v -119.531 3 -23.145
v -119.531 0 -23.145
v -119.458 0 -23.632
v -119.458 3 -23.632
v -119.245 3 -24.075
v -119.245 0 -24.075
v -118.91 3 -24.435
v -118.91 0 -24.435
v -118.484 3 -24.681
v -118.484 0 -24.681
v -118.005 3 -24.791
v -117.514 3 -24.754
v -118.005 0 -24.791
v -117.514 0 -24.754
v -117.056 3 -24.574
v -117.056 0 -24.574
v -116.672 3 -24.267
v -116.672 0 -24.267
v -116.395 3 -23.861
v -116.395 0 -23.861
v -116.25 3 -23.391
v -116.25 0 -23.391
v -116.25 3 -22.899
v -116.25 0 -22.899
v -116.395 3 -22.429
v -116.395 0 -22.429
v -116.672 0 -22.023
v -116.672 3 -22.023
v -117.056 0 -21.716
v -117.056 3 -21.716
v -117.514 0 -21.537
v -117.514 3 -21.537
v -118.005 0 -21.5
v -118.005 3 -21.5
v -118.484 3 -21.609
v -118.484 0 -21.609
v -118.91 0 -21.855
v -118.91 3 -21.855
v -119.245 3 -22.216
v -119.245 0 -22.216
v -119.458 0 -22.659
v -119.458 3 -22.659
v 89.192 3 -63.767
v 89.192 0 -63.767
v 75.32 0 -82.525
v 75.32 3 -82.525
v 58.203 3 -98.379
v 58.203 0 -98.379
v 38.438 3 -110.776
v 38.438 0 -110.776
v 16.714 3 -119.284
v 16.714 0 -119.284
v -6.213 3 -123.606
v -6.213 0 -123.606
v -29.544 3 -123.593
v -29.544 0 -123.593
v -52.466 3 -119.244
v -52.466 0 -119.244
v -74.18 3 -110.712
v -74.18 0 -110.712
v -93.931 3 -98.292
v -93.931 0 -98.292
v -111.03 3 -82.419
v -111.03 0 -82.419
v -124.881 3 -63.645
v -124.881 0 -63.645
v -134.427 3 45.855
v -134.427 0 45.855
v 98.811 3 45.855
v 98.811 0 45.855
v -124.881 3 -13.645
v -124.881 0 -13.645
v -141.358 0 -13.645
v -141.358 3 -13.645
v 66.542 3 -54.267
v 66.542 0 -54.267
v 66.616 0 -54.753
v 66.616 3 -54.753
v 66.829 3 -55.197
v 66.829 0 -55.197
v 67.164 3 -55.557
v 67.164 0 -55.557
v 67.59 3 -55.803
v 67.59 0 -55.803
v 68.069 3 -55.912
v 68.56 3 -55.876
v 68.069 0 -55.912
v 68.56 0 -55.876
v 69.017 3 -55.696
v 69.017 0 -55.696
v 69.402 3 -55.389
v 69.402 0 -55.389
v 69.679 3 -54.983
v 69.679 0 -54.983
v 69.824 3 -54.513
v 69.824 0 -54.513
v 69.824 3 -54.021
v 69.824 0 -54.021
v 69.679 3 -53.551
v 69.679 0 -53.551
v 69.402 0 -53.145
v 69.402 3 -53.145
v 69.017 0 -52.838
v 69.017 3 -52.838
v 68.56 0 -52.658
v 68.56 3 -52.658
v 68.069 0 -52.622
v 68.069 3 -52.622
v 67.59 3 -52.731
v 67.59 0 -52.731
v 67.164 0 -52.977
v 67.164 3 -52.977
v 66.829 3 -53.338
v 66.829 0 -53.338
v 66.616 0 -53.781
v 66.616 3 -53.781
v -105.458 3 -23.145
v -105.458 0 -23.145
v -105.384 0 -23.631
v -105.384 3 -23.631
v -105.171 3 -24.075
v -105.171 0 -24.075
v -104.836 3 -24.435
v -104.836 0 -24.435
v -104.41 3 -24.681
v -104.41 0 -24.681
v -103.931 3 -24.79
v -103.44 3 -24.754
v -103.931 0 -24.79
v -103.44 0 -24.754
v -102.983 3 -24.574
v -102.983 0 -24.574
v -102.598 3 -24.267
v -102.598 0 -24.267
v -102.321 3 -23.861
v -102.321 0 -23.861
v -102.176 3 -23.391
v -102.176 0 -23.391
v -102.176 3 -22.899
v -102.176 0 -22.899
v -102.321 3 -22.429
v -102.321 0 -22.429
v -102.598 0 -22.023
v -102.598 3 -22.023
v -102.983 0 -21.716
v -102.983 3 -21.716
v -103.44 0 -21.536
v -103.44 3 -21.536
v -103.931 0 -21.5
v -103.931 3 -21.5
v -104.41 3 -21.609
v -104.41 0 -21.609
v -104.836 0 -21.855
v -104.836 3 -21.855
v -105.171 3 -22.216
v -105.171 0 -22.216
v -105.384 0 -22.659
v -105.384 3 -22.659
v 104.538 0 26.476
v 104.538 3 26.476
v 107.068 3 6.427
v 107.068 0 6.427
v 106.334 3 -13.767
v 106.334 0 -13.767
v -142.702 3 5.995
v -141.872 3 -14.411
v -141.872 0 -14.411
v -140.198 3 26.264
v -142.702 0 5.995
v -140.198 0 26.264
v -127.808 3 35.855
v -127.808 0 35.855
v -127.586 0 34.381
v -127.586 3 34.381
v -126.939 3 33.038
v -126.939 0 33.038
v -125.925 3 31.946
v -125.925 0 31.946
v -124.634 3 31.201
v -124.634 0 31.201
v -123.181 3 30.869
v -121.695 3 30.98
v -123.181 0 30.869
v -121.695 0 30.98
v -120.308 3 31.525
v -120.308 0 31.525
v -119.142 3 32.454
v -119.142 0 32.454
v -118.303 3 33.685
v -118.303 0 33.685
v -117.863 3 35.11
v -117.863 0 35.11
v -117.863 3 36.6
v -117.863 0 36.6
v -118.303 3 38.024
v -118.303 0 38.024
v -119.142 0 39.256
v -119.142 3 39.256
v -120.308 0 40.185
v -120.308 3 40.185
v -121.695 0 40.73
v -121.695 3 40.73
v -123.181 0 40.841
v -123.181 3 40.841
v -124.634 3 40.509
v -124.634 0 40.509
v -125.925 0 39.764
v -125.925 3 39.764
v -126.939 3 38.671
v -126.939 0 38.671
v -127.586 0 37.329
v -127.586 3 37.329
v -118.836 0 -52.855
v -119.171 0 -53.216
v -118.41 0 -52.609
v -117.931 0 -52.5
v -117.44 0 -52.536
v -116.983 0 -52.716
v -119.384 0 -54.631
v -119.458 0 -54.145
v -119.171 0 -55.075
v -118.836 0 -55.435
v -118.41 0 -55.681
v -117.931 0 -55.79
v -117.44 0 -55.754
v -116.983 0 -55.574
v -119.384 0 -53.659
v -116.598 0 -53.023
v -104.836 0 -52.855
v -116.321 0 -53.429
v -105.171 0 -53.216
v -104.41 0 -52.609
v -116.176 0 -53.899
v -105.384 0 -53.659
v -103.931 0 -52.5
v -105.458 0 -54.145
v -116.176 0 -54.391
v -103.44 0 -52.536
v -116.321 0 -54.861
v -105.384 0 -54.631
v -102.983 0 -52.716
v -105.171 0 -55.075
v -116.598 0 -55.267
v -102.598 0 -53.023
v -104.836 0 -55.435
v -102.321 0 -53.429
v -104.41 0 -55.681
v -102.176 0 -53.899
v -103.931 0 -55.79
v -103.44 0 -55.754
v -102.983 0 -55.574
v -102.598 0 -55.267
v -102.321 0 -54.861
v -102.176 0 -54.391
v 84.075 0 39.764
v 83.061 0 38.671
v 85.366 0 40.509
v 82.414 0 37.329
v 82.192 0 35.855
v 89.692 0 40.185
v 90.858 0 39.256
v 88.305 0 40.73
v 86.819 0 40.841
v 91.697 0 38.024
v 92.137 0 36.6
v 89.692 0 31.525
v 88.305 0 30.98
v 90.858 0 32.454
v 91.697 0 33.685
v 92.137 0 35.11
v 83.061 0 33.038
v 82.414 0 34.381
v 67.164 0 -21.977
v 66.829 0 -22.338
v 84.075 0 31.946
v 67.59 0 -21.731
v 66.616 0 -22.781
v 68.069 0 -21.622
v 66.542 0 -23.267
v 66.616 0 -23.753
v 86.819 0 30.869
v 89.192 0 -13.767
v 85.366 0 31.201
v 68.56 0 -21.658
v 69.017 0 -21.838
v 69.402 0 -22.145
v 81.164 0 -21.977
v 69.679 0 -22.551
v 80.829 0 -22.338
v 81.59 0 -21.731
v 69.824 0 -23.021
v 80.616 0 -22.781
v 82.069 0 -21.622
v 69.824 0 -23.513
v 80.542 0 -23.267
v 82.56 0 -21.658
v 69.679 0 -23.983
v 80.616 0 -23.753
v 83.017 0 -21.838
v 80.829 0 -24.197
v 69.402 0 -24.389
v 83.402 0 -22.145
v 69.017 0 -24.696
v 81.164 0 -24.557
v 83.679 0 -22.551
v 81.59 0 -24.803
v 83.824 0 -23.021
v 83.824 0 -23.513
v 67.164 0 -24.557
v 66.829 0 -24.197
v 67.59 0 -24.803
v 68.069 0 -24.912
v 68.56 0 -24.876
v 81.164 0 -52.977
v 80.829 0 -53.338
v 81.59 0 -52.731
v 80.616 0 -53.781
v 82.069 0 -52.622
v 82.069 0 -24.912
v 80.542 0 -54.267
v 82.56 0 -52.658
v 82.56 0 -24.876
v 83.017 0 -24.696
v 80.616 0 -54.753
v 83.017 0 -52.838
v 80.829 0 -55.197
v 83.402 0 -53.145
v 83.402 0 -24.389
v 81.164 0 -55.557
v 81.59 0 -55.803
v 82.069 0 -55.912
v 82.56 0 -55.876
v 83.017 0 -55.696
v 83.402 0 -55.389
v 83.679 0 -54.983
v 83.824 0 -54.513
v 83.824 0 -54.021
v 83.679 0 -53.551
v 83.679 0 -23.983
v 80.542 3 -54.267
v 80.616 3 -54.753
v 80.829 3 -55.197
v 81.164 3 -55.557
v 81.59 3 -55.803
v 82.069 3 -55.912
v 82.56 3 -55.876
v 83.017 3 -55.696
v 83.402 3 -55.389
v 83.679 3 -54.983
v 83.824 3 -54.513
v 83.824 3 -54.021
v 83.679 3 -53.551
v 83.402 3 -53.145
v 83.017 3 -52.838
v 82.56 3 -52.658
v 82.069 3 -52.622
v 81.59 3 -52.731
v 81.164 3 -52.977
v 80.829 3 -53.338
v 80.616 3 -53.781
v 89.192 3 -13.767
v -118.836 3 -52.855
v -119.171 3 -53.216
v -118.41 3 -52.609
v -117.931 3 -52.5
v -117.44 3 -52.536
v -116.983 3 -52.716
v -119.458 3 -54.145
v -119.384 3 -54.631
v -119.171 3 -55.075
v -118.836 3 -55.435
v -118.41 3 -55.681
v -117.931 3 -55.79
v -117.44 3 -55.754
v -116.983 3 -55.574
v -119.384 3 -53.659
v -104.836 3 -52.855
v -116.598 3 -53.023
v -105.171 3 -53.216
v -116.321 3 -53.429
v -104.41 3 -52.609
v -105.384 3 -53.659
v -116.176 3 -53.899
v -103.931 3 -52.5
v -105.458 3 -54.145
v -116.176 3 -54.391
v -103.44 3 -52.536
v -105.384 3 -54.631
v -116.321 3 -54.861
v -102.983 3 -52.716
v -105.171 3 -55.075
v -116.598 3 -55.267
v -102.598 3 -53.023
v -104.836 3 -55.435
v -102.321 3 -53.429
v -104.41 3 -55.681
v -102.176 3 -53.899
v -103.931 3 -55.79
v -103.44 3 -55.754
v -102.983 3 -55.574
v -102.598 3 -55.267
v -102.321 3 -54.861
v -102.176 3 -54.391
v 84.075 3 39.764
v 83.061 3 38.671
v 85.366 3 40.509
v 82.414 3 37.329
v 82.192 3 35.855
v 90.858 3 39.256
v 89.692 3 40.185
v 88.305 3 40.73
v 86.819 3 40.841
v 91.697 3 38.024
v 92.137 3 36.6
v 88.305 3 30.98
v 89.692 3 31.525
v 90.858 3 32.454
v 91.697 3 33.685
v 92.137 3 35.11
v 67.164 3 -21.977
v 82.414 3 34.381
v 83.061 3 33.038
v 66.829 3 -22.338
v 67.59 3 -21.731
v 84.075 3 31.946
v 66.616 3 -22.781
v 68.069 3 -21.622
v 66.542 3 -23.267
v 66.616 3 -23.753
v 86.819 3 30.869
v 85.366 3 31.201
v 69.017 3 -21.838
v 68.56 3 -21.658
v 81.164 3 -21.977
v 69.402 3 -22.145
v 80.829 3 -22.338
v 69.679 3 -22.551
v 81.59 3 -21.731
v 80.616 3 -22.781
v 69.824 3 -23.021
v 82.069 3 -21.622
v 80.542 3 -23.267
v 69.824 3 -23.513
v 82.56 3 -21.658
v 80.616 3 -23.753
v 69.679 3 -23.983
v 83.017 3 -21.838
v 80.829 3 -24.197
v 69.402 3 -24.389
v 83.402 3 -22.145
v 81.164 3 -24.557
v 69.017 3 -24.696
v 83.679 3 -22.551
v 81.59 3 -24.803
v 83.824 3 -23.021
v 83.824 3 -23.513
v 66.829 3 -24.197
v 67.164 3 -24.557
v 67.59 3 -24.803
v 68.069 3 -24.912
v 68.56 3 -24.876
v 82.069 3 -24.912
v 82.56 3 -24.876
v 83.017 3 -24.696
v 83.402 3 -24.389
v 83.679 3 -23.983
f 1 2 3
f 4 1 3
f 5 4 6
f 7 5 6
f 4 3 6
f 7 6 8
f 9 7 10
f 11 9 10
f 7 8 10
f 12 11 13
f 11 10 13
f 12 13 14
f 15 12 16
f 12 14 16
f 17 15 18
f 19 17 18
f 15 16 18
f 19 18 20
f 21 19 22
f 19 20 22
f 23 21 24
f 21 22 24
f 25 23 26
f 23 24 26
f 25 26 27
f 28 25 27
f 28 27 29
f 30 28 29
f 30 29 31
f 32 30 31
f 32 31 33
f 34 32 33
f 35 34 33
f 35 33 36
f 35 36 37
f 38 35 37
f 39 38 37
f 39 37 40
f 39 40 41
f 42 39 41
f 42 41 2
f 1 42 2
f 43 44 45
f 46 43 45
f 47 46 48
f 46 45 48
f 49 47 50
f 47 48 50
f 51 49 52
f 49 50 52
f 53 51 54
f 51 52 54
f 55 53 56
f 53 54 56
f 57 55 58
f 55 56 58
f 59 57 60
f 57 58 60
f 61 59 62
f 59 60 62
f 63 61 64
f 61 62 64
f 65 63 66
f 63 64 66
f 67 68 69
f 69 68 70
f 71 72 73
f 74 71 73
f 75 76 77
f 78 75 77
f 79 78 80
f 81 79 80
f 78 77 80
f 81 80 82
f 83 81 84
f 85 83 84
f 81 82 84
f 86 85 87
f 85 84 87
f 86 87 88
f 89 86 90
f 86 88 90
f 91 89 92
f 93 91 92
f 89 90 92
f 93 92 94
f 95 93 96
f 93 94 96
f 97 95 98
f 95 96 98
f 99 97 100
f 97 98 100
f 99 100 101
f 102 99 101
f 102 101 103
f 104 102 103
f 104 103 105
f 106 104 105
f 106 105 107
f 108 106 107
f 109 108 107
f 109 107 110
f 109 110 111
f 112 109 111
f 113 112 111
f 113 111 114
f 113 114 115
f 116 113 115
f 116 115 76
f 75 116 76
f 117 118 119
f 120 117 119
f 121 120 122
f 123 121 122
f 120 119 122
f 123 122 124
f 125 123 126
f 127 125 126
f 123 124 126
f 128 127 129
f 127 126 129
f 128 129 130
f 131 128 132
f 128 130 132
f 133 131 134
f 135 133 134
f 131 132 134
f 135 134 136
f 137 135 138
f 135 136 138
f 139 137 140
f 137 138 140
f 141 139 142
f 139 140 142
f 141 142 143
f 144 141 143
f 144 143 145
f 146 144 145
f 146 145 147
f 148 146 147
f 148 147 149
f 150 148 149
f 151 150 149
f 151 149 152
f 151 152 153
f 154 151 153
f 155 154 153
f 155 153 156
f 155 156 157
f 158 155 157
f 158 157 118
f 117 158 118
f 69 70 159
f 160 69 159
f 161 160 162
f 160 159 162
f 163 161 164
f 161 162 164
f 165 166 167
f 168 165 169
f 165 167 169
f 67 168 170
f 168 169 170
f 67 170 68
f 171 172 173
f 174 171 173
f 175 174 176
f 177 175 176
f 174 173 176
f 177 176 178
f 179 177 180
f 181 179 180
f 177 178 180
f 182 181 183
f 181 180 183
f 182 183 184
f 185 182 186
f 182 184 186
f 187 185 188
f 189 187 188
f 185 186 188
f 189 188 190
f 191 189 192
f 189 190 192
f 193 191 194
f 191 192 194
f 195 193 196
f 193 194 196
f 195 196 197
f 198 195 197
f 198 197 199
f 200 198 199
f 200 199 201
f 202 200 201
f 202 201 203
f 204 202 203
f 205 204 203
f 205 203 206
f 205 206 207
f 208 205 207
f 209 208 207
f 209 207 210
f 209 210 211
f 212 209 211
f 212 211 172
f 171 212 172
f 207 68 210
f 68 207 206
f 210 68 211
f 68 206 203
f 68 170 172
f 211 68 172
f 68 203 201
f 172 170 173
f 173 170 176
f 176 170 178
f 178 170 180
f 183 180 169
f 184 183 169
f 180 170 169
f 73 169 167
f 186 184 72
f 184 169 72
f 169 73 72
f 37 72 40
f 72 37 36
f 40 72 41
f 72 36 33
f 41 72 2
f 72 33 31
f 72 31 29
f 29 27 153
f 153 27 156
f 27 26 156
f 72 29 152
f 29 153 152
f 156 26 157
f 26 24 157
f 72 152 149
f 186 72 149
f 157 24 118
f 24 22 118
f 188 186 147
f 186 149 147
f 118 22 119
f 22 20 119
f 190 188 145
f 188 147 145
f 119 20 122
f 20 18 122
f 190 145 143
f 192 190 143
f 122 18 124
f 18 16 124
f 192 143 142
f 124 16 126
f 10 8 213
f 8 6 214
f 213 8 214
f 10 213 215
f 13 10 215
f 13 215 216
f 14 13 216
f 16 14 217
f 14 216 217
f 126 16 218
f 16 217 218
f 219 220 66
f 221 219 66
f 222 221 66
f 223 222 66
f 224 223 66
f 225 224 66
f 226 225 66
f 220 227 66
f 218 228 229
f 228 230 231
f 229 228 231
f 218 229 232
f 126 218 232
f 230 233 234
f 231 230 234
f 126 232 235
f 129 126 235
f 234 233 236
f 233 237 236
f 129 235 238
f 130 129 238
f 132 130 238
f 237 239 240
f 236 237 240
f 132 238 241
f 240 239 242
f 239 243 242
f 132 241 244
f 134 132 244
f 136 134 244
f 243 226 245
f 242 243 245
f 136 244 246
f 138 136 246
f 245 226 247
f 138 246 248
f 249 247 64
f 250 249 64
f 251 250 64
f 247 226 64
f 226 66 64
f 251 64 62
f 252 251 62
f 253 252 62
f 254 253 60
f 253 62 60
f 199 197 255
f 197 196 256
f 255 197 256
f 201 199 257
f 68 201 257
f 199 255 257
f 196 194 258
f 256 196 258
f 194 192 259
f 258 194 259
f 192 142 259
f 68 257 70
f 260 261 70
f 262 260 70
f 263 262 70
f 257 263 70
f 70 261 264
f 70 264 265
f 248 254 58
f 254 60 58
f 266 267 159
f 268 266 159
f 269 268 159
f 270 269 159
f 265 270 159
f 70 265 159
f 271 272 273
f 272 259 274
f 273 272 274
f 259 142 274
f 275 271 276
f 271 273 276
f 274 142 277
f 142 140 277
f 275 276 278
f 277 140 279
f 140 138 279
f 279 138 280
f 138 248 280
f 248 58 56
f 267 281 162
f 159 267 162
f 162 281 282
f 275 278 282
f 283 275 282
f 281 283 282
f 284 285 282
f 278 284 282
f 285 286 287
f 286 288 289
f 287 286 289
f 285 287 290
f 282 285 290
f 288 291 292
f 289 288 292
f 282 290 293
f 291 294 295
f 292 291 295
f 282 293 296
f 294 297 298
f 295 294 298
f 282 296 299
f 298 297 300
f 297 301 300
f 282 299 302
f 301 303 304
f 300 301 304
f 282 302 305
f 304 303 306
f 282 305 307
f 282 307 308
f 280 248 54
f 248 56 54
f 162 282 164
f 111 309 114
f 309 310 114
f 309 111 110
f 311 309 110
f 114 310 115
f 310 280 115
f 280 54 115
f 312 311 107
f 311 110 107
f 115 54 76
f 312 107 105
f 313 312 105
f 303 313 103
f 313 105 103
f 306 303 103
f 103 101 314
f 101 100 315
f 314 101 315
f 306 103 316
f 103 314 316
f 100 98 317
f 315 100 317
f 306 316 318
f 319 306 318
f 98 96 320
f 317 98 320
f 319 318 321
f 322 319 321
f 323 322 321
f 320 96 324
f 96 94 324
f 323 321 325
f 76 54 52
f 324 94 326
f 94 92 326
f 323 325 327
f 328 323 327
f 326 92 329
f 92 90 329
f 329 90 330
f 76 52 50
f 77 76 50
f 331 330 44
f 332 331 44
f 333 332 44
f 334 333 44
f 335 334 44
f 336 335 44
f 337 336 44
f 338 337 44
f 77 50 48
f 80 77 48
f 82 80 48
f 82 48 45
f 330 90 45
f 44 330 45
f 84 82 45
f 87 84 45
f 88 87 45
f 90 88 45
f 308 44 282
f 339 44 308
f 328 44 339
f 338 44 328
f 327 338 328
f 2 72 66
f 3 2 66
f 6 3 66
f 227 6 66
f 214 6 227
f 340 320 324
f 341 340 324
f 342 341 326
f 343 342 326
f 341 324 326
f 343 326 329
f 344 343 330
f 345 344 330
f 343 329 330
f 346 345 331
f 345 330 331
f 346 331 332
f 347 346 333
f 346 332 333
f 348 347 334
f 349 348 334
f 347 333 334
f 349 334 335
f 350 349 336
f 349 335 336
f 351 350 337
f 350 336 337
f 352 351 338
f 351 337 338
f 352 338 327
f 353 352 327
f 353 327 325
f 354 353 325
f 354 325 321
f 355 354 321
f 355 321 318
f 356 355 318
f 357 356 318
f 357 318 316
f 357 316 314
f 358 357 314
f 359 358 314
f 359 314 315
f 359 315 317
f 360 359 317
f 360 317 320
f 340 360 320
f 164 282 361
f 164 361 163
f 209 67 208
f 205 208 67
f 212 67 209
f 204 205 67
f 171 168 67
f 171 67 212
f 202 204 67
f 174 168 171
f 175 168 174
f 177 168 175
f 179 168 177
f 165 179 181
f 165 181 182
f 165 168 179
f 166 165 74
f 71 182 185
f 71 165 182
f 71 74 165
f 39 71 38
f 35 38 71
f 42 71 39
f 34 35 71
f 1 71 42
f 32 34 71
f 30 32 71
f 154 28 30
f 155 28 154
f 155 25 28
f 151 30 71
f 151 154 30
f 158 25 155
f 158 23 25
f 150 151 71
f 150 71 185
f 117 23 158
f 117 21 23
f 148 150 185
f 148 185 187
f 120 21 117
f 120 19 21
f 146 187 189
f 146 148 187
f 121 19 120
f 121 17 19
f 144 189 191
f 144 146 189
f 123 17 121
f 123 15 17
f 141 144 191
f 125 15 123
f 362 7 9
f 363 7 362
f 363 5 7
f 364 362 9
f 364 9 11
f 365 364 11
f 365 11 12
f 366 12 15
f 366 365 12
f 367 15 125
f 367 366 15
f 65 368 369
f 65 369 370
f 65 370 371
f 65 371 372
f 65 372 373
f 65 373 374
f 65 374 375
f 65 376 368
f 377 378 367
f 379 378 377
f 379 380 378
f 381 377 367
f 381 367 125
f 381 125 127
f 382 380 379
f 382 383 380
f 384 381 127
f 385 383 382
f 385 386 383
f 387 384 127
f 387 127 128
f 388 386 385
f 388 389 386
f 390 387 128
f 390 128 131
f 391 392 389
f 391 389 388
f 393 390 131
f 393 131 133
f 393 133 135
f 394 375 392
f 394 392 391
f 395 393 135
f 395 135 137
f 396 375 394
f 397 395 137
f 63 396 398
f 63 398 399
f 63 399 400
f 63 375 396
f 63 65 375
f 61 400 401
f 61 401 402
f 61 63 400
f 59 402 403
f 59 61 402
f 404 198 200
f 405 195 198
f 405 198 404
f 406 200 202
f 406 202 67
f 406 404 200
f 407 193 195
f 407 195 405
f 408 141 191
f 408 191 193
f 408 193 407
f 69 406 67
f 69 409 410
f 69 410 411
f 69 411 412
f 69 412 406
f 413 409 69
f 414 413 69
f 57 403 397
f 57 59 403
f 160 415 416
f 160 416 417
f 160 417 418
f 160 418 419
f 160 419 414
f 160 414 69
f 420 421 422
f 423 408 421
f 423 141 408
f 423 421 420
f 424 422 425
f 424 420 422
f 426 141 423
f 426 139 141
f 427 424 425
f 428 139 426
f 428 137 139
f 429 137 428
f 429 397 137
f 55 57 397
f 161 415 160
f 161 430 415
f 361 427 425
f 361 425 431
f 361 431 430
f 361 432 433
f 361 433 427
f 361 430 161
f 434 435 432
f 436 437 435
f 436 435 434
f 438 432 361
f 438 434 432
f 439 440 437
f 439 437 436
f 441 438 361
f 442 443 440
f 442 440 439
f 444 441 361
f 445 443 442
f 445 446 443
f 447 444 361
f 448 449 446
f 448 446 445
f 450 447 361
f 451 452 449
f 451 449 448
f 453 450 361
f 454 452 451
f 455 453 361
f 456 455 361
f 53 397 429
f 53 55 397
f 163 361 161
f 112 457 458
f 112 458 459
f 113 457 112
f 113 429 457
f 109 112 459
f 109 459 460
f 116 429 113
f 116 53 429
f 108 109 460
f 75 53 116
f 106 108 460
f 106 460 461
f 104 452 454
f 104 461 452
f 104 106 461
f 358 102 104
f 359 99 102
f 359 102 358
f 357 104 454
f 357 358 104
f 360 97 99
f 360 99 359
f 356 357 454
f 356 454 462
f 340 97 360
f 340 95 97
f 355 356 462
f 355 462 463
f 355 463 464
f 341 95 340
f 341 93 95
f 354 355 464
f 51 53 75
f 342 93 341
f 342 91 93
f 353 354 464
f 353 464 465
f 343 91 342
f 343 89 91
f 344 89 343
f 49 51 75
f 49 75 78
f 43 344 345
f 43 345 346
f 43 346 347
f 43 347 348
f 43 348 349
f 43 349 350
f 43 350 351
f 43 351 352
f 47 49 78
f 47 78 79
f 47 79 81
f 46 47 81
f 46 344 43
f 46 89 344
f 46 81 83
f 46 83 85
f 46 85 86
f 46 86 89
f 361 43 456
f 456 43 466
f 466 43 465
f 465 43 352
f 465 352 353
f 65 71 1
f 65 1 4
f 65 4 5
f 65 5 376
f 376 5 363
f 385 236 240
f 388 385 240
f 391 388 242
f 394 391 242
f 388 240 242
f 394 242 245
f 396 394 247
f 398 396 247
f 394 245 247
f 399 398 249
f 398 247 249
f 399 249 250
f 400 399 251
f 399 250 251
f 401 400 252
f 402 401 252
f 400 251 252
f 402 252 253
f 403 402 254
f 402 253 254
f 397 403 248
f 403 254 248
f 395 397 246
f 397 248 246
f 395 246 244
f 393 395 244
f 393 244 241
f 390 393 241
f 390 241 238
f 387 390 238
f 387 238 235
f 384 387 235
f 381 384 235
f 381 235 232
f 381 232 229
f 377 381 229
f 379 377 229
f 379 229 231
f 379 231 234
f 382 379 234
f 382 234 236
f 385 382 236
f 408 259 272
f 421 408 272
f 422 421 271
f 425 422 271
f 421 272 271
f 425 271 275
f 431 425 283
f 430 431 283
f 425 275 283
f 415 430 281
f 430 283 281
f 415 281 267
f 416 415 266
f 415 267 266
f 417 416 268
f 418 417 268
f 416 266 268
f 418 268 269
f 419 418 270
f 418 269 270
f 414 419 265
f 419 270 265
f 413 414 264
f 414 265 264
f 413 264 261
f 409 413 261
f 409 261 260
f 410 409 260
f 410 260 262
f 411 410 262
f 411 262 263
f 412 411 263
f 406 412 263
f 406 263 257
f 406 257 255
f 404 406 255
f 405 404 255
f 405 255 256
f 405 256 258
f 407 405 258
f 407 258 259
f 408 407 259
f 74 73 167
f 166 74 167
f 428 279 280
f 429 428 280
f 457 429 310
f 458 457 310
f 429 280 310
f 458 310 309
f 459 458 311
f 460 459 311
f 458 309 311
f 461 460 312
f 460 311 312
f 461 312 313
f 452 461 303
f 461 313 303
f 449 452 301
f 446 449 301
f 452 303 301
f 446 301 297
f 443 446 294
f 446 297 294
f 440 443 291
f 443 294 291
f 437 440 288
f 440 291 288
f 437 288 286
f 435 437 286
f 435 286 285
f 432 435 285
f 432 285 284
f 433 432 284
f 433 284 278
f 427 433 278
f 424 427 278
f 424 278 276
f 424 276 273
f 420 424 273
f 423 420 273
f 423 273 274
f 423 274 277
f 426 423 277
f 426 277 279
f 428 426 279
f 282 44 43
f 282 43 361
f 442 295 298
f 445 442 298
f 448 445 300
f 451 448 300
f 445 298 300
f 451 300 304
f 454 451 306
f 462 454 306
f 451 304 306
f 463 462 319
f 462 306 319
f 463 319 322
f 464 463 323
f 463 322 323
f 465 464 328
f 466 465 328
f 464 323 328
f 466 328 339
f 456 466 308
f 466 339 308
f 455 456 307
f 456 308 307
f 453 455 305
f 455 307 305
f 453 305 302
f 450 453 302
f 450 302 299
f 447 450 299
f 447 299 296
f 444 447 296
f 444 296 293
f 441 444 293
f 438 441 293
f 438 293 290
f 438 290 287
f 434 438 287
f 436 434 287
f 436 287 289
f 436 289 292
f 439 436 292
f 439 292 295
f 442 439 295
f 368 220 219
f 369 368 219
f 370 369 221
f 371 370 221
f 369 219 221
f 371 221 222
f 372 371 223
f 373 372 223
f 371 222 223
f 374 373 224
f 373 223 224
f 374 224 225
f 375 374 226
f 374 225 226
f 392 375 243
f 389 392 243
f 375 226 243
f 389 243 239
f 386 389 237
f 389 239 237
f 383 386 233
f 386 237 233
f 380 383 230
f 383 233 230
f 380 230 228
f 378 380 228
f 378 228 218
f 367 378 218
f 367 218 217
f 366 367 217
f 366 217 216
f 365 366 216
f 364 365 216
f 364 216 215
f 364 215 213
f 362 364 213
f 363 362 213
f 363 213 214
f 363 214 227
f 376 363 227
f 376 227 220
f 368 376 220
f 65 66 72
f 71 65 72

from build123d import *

# Parameters (mm, degrees)
SKETCH2_R           = 125
BOSS_EXTRUDE1_DEPTH = 3
CUT_EXTRUDE1_DEPTH  = 3
SKETCH4_R           = 1.65
SKETCH4_R_2         = 5
CUT_EXTRUDE2_DEPTH  = 10


with BuildPart() as part:
    # Sketch2 → Boss-Extrude1 (new body)
    with BuildSketch(Plane(origin=(0, 0, 0), x_dir=(1, 0, 0), z_dir=(0, 1, 0))):
        with Locations((-17.80765369, -0.854894607)):
            Circle(SKETCH2_R)
    extrude(amount=BOSS_EXTRUDE1_DEPTH)

    # Sketch3 → Cut-Extrude1 (cut)
    with BuildSketch(Plane.XZ):
        Polygon((-735.289651923, 45.854894607), (-134.426691587, 45.854894607), (98.811384207, 45.854894607), (699.674344543, 45.854894607), (699.674344543, 1247.580815278), (-735.289651923, 1247.580815278), align=None)
    extrude(amount=-CUT_EXTRUDE1_DEPTH, mode=Mode.SUBTRACT)

    # Sketch4 → Cut-Extrude2 (cut)
    with BuildSketch(Plane(origin=(0, 0, 0), x_dir=(-1, 0, 0), z_dir=(0, -1, 0))):
        with Locations((117.80765369, 54.145105393)):
            Circle(SKETCH4_R)
        with Locations((117.881226527, 23.145192699)):
            Circle(SKETCH4_R)
        with Locations((103.80765369, 54.145105393)):
            Circle(SKETCH4_R)
        with Locations((103.80765369, 23.145105393)):
            Circle(SKETCH4_R)
        with Locations((-68.19234631, 54.267083079)):
            Circle(SKETCH4_R)
        with Locations((-82.19234631, 54.267083079)):
            Circle(SKETCH4_R)
        with Locations((-82.19234631, 23.267083079)):
            Circle(SKETCH4_R)
        with Locations((-68.19234631, 23.267083079)):
            Circle(SKETCH4_R)
        with Locations((122.80765369, -35.854894607)):
            Circle(SKETCH4_R_2)
        with Locations((-87.19234631, -35.854894607)):
            Circle(SKETCH4_R_2)
        Polygon((124.881226527, 63.645105393), (124.881226527, 13.645105393), (141.357501756, 13.645105393), (159.377606719, 40.481299306), align=None)
        Polygon((-89.19234631, 63.767083079), (-89.19234631, 13.767083079), (-106.334191667, 13.767083079), (-114.079843912, 54.596315864), align=None)
    extrude(amount=-CUT_EXTRUDE2_DEPTH, mode=Mode.SUBTRACT)


solid = part.part
